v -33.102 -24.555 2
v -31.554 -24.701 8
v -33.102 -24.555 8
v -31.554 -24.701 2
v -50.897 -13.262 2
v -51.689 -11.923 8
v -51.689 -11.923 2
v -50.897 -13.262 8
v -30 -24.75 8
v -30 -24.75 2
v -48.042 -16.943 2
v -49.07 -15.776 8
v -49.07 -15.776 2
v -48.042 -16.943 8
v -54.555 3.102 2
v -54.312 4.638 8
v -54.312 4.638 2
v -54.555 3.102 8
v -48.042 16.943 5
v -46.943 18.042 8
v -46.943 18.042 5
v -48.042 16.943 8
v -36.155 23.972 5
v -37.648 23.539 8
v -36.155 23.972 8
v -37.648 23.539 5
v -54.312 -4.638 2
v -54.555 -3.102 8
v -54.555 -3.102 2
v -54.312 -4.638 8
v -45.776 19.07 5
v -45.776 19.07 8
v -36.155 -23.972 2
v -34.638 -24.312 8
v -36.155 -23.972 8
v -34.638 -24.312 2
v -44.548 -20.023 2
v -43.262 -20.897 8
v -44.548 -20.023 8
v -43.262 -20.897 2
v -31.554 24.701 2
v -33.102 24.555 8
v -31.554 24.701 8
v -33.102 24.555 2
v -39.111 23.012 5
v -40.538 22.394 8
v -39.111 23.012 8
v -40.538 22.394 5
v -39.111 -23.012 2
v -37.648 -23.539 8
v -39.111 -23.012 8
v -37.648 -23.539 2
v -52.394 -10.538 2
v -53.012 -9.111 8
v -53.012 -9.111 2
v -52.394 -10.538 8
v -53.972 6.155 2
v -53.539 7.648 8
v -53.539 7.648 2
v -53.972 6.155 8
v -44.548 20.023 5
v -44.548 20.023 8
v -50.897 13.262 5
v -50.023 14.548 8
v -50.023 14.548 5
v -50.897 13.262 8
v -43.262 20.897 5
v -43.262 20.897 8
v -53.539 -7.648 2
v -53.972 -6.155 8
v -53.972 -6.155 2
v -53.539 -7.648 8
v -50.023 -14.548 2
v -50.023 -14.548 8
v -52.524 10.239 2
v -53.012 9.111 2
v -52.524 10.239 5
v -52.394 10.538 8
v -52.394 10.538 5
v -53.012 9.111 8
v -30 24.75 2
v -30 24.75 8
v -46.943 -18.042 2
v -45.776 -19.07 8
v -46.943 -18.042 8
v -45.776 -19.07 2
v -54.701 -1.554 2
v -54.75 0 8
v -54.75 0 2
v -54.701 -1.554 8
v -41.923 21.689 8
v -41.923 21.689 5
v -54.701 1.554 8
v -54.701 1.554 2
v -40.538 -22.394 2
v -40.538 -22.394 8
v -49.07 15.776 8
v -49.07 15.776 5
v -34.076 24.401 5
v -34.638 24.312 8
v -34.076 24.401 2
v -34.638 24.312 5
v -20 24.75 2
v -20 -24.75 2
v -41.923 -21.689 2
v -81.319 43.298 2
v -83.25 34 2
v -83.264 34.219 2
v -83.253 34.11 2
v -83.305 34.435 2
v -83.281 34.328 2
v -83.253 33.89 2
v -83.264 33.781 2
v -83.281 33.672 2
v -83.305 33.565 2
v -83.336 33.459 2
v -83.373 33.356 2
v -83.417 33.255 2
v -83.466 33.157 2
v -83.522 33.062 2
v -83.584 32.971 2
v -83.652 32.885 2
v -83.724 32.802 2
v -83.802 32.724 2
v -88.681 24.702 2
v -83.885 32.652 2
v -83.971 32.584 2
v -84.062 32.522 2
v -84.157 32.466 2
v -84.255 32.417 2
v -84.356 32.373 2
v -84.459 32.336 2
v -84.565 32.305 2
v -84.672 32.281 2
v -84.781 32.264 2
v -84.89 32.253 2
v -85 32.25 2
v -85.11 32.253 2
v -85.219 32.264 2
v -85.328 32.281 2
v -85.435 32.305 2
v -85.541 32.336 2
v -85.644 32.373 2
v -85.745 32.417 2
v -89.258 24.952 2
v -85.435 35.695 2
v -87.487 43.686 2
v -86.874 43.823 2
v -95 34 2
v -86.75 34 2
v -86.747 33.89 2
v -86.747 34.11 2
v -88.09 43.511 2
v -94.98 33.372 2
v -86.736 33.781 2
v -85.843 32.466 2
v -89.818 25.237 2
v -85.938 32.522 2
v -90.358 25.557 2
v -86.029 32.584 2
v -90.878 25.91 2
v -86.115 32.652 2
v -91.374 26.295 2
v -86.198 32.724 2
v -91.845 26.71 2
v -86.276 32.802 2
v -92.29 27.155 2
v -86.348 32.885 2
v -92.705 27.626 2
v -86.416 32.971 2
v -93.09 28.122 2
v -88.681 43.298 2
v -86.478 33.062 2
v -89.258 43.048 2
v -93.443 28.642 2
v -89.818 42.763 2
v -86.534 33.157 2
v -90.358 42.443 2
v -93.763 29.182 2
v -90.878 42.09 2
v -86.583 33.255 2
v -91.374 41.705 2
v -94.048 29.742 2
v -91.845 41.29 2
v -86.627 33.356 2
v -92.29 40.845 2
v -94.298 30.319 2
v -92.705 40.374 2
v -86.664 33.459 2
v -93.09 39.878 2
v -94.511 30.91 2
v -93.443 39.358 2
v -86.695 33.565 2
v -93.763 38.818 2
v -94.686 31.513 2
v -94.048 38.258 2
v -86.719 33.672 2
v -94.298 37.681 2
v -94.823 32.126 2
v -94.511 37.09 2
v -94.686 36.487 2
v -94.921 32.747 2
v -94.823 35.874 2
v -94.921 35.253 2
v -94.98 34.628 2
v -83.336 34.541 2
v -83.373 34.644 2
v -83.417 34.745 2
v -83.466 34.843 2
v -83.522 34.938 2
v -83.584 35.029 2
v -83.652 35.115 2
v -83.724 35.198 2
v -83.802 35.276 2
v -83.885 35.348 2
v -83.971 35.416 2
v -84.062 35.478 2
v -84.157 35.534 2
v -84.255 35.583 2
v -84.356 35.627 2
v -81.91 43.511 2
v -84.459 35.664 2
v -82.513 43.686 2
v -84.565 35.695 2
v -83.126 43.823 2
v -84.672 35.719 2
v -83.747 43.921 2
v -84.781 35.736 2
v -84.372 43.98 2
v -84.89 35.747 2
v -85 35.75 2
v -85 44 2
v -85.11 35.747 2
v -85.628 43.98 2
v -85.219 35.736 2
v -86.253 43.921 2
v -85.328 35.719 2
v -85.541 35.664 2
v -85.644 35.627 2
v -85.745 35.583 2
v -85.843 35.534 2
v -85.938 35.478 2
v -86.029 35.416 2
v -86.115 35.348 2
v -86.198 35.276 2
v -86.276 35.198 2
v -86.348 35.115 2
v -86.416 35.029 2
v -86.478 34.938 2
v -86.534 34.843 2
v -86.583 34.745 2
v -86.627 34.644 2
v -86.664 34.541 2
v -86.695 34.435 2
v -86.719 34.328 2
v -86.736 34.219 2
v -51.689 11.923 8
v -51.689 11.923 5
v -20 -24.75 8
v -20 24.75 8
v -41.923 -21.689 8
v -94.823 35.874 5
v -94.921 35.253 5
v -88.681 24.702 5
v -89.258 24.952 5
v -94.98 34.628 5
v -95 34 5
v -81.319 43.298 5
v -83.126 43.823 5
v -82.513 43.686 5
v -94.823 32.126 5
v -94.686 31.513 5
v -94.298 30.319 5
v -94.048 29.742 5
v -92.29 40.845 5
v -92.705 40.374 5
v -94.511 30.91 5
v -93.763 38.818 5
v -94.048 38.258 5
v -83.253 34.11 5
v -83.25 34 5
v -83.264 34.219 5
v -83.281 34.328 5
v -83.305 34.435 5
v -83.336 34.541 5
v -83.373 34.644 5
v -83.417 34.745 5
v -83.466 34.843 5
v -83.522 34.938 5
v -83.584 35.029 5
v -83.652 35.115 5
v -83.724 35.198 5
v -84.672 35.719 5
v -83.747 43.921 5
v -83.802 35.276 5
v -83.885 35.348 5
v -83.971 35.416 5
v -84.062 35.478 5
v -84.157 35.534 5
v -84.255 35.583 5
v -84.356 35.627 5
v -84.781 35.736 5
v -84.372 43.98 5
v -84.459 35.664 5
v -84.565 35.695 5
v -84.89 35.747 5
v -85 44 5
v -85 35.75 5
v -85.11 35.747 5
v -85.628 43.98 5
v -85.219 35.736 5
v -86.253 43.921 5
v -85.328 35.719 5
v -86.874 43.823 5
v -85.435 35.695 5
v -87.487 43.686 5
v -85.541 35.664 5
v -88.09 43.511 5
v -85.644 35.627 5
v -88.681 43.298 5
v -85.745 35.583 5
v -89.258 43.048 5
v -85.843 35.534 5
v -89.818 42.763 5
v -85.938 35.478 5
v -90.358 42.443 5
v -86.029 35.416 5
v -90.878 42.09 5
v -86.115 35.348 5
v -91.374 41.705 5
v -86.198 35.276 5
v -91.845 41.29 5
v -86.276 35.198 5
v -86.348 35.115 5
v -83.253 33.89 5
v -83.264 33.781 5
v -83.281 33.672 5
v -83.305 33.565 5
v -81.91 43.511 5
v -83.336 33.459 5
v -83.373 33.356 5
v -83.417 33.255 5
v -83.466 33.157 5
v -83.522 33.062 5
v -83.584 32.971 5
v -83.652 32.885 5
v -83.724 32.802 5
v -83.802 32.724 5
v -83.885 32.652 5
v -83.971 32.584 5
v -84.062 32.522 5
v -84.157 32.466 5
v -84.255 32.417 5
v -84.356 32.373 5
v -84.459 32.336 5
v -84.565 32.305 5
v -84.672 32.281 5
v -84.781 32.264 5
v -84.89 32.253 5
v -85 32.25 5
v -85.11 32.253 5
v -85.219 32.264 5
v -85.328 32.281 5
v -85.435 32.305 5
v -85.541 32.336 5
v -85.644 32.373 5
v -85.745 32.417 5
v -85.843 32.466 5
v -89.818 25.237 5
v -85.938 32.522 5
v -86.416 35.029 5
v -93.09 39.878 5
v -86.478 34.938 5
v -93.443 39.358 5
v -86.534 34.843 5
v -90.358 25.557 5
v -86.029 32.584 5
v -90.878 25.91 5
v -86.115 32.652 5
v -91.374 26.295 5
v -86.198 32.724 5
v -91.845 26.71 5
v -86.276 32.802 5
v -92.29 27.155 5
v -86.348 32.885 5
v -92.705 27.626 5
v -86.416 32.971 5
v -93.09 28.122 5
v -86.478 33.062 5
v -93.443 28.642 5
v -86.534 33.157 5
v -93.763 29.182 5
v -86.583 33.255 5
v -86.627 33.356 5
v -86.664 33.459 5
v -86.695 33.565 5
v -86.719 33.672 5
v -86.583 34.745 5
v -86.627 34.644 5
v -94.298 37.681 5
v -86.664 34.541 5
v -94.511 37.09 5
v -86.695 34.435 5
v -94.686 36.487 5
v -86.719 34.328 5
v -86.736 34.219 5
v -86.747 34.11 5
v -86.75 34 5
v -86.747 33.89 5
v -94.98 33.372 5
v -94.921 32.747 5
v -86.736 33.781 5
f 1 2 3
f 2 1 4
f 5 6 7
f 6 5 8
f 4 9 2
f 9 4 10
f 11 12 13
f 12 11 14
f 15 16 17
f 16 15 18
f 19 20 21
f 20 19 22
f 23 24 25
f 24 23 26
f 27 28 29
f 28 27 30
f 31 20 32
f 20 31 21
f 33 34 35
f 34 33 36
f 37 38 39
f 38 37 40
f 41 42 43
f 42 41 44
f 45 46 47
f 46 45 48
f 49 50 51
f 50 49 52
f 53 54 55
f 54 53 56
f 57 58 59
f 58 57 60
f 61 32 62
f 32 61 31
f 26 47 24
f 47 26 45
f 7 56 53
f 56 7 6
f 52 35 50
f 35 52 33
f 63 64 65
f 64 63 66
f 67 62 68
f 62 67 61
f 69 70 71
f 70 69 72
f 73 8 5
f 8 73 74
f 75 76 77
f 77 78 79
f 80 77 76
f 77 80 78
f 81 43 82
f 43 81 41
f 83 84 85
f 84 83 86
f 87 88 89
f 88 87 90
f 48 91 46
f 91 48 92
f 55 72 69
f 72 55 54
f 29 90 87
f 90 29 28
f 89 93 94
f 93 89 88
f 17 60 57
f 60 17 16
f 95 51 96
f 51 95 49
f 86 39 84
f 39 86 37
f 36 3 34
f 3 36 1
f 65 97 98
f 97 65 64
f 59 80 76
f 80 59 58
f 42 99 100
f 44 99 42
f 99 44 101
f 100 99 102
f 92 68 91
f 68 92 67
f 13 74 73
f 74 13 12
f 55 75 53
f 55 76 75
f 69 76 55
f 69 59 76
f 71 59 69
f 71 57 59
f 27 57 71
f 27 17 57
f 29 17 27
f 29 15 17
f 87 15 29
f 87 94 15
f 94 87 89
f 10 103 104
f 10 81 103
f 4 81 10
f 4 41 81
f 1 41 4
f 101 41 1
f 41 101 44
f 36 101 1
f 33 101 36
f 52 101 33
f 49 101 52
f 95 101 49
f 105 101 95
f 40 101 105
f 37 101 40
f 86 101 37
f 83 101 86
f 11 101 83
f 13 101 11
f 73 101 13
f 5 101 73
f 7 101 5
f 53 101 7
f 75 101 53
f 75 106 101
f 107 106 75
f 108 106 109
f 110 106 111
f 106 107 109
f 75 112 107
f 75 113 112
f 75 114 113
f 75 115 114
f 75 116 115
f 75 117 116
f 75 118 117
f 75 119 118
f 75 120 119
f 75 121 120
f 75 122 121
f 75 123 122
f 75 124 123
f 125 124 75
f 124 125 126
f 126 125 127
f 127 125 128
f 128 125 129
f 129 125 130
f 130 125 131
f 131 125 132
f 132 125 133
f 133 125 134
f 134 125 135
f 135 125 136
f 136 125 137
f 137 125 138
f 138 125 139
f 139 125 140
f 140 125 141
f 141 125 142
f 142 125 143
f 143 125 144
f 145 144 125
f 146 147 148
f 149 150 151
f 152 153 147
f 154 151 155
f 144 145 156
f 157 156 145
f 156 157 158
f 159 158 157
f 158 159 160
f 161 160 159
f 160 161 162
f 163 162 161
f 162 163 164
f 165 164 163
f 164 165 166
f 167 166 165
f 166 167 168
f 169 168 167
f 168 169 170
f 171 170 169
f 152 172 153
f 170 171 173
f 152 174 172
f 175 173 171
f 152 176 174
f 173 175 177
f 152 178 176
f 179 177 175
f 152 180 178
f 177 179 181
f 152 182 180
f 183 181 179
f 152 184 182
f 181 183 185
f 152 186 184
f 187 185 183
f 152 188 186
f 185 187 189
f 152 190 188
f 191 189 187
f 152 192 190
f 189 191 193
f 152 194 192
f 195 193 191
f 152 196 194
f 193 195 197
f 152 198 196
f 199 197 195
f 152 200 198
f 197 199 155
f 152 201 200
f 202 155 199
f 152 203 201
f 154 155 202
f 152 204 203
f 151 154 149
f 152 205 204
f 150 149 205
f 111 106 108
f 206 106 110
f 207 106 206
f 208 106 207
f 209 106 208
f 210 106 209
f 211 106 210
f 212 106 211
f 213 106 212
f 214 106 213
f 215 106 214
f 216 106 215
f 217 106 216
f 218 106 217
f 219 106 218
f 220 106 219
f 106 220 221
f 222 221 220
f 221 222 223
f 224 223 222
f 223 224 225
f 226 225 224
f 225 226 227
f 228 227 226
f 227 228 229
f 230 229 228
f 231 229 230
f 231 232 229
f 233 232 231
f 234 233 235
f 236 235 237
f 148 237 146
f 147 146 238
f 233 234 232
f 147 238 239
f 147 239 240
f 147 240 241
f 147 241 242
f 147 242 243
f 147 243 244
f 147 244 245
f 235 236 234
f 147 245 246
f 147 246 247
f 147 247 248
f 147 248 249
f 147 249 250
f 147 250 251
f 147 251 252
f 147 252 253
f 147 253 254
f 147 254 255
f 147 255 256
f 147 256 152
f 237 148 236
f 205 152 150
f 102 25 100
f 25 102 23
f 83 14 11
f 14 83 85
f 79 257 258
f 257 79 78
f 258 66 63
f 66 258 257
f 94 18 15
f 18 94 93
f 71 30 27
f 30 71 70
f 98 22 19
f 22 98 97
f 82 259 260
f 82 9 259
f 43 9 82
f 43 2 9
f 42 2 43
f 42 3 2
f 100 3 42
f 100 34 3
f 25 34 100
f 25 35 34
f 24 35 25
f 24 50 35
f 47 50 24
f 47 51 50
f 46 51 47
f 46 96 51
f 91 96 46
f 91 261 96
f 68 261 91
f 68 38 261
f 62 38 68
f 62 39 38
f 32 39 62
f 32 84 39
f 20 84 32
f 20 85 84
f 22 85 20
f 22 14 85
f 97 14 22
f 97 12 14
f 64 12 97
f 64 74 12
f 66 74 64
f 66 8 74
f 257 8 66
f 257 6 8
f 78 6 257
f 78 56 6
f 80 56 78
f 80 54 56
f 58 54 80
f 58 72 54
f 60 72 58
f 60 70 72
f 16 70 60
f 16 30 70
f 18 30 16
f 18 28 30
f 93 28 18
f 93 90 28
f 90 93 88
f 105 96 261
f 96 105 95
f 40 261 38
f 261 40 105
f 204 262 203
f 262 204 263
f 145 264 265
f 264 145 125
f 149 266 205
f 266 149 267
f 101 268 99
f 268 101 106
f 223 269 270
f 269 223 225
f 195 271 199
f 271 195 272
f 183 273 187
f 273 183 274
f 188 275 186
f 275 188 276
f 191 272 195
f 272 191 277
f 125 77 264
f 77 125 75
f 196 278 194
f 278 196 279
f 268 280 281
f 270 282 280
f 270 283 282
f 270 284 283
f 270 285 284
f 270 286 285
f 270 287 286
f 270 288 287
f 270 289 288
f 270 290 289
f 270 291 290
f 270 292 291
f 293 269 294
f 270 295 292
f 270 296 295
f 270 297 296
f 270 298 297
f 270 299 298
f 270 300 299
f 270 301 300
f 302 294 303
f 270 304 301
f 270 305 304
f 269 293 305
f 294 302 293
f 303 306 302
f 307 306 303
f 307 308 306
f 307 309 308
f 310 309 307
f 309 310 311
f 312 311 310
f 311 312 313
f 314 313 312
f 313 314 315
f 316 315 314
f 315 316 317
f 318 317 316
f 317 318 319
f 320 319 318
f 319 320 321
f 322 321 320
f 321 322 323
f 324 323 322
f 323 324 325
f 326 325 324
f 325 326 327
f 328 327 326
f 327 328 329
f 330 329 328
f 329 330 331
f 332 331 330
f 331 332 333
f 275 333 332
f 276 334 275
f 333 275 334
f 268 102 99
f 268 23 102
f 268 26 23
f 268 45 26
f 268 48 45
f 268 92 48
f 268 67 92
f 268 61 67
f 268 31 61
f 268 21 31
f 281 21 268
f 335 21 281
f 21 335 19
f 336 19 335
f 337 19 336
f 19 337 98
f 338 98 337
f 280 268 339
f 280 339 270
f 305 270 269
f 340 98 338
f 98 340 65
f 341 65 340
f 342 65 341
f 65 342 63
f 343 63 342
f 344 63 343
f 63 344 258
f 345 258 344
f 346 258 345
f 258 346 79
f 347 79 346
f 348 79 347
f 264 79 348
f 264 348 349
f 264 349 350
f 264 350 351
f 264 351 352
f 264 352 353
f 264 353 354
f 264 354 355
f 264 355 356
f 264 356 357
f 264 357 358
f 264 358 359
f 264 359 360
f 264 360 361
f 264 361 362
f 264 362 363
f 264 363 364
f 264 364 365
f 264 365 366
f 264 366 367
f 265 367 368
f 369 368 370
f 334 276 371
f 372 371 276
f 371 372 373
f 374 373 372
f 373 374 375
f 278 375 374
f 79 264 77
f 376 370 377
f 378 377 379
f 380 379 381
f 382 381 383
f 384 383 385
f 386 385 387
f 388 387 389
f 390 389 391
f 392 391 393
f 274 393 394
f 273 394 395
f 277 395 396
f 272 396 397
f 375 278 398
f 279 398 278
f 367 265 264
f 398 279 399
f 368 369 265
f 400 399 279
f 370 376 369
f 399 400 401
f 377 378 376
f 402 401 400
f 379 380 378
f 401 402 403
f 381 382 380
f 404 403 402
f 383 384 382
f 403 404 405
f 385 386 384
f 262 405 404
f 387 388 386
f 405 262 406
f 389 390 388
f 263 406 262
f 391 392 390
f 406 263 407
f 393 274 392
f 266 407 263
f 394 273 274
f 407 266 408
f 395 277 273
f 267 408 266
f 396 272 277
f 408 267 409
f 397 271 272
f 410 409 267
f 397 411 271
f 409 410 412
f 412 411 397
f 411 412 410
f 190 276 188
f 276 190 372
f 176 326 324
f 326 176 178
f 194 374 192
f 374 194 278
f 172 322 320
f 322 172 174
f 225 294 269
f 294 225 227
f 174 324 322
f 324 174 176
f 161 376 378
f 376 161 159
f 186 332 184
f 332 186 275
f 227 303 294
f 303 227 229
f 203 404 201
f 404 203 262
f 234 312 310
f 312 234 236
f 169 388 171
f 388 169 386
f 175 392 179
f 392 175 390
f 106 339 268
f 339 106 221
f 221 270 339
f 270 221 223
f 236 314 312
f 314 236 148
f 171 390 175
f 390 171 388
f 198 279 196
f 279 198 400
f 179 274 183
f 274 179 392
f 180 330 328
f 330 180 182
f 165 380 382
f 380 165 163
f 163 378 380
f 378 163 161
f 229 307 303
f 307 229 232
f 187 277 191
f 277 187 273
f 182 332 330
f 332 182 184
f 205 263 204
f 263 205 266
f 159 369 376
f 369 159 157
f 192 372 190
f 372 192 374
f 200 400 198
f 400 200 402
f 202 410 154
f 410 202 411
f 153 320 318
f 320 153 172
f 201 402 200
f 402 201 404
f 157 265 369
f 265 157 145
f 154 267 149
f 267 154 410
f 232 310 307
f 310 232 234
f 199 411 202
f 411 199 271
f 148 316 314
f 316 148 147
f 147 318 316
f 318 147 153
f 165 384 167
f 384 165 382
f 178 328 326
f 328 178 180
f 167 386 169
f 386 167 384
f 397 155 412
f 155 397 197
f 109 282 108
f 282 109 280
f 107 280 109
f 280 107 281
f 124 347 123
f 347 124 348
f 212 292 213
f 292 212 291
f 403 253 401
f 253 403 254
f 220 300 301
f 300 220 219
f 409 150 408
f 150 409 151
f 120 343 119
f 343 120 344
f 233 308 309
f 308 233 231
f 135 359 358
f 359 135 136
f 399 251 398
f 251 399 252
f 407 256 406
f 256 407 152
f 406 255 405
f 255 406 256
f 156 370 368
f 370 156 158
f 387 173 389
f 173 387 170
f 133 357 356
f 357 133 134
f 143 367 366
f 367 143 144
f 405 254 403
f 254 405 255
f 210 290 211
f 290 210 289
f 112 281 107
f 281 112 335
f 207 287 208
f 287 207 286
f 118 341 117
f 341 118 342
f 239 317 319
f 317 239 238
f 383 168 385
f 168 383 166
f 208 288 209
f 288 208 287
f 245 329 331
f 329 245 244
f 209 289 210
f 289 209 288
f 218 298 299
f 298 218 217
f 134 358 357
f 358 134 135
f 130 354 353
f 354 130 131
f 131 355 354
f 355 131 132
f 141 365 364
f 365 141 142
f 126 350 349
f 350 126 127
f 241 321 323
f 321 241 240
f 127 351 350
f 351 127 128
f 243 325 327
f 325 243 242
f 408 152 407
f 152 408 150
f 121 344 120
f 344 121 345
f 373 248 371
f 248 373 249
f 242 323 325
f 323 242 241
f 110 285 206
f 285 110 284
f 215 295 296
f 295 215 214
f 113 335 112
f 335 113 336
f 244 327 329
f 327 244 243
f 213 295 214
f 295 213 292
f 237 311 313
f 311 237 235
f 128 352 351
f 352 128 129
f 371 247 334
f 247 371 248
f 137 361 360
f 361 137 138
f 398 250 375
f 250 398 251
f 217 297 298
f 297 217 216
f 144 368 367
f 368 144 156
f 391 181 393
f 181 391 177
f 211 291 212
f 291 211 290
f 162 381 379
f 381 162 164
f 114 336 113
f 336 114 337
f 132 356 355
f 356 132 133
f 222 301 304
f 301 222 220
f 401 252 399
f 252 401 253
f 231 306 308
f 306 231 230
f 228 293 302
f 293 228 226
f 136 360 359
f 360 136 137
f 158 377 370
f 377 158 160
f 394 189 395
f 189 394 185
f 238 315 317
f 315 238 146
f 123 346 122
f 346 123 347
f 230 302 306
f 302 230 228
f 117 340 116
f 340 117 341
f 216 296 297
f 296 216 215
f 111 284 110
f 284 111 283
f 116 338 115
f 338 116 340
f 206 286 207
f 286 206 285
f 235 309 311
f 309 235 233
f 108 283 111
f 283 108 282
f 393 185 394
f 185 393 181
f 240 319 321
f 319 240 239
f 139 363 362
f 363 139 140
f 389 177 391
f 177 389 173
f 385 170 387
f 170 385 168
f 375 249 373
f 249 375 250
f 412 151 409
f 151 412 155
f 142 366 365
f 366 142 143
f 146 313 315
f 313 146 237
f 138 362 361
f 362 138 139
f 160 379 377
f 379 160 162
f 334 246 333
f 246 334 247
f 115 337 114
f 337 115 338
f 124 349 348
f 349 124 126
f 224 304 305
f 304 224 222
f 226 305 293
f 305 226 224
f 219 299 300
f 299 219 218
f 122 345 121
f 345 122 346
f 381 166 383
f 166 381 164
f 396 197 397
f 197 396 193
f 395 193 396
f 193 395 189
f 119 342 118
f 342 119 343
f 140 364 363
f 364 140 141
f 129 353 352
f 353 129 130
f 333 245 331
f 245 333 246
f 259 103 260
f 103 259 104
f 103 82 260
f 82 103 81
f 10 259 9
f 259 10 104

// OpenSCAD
// file: car_v10_lib.scad
module _guanDao(){
    
    circle(0.6); 
    translate([0,-0.5]) square([1.2,1],center=true);
    translate([0,-1]) circle(0.6); 
    
}
 
module cyInterfaceBig(t_d=4.8,fk=1.1,_h = 36){
    __h = _h/2-2;
    difference(){ 
        union(){
            cylinder(d=t_d,h=_h,center=true);
            translate([0,0,__h]) {
                cylinder(d1=t_d*fk,d2 = t_d,h=3,center=false);
                translate([0,0,-2]) cylinder(d=t_d*fk,h=2,center=false);
                translate([0,0,-5]) cylinder(d2=t_d*fk,d1 = t_d,h=3,center=false);
            }
        }
        translate([0,0,__h]) cube([t_d+2,t_d/5,t_d+10],center=true);
    }    
}
module cyInterface(t_d=4.8,fk=0.8,_h = 36){
    __h = _h/2-1;
    difference(){ 
        union(){
            cylinder(d=t_d,h=_h,center=true);
            translate([0,0,__h]) {
                cylinder(d1=t_d+fk,d2 = t_d,h=2,center=false);
                translate([0,0,-1]) cylinder(d=t_d+fk,h=1,center=false);
                translate([0,0,-3]) cylinder(d2=t_d+fk,d1 = t_d,h=2,center=false);
            }
        }
        translate([0,0,__h]) cube([t_d+2,1,10],center=true);
    }    
}



module _links( dx = 14){
    out_d = 9.5;
    //l_h = 3.4;
    t_d = 4.8;    
    t_h_ = 26;
    //t_y_ = 12.3;
    
    translate([-8,0,1.5]) rotate([0,-90,0]) difference(){
        cyInterface(t_d = t_d,_h = t_h_);
        translate([-2.5,0,0]) cube([2,6,t_h_*2],center=true);
    }
    /*
    difference(){
        //hull(){
        translate([dx,0,0]) union(){
            cylinder(d=out_d,h=2,center=false);
            translate([-out_d/2,0,1]) cube([out_d,out_d,2],center=true);
        }
          //  translate([-dx,0,0]) cylinder(d=out_d,h=2,center=false);
        //}
        translate([dx,0,0]) cylinder(d=5.5,h=5,center=true);
        //translate([-dx,0,0]) cylinder(d=5.5,h=5,center=true);
    }
    */
}
function kugel_zu_kart(vect) = [
	vect[0]*sin(vect[1])*cos(vect[2]),  
	vect[0]*sin(vect[1])*sin(vect[2]),
	vect[0]*cos(vect[1])
];
// file: car_v10_motor_room.scad
use <car_v10_lib.scad>
$fn=80;
motorRoom();
module motorRoom(_h=18,_d=25){
    ___h = _h+1.6;
    
    _gh = 7;
    
   // rotate([0,90,0])  
    
      
    difference(){
        union(){
            rotate([0,90,0]) union(){
                intersection(){
                    cylinder(d=_d,h=_h);
                    translate([0,0,_h/2]) cube([19.5,_d,_h],center=true);
                    
                }
                translate([0,0,-2.6])  _ring_lib();
                // translate([0,0,_h-_gh]) cylinder(d1 = _d,d2=_d+2,h=_gh);
               
            } 
        }
        translate([15.3,0,0])  cylinder(d=3.5,h=40,center=true);
        
        translate([15.8,0,0])   rotate([0,90,0]) rotate_extrude(angle=360) translate([12.5,0]) _guanDao();        
        translate([15.8,0,9.8])  rotate([0,90,0]) rotate([90,0,0])   linear_extrude(height=30,center=true) _guanDao();
        translate([15.8,0,-9.8])  rotate([0,90,0]) rotate([90,0,0])   linear_extrude(height=30,center=true) _guanDao();
        
        translate([_h/2,0,0]) union(){
            intersection(){
                rotate([0,90,0]) cylinder(d=21.5,h=___h,center=true);
                cube([___h,25,16],center=true);
            }
          //  cube([___h,6,20],center=true);
        } 
       
     // translate([_h-_gh/2,0,0]) # cube([_gh,16,28],center=true); 
    }
}


module _ring_lib(){ 
    union(){
        //#motor();
        difference(){
            intersection(){
                cylinder(r2=16.5,r1=15.5 ,h=2.6);
                cylinder(r=16.2,h=2.6);
            }
            translate([0,0,-4])cylinder(h=27,d=9.5);
        }

        intersection(){
            translate([0,0,0]) union(){
                cylinder(r1=18,r2=18.4 ,h=2.6);
                //translate([0,0,-0.5]) cylinder(r=16,h=5);
            } 
            _ring_Ka(r=17,x=5,y=5.3,m=9,z=2.6); 
        }
        
        intersection(){
            translate([0,0,1.8]) union(){
                cylinder(r=18.5 ,h=2.6);
                //translate([0,0,-0.5]) cylinder(r=16,h=5);
            } 
            _ring_Ka(r=17,x=5,y=5.3,m=9,z=2.6); 
        }
    }   
    
    
    module _ring_Ka(x=5,y=1.8,z=4,r=19,m=6){    
    tou = 360/m;             
    for(n=[0:1:m-1]){
        translate(kugel_zu_kart([r,90,360/m*n]))  translate([0,0,0])  rotate([0,0,tou*n])       translate([0,0,z/2]) cube([x,y,z],center=true);
    }
    
}
 
}
// main file
use <car_v10_battery.scad>
use <car_v10_motor_room.scad>

$fn=100;
_r = 65;
_h=30;
my=30;

translate([0,-12,-26.6])  batteryBody();
finderFixDown();
mirror([0,1,0]) finderFixDown();
!finderFix();
 
module finderFix(){
    outx = -50;
    outy = 20;
    translate([-30,0,5]){
        translate([5,0,0]) cube([10,49.5,6],center=true);
        difference(){        
            cylinder(d=49.5,h=6,center=true);
            translate([20,0,0]) cube([40,49.5,7],center=true);
        }
        translate([-5,14,-1.5]) difference(){
            hull(){        
                cylinder(d=20,h=3,center=true);
                translate([outx,outy,0]) cylinder(d=20,h=3,center=true);
            }
            translate([outx,outy,0]) cylinder(d=3.5,h=10,center=true);
            //translate([-30,0,0]) cylinder(d=3.5,h=10,center=true);
        }
    }
    /*
    #union(){
        translate([0,0,0]) cube([8,13,22],center=true);
        translate([-15,0,0])  rotate([0,0,0]) {
            translate([0,3.5,0])   cylinder(d=5.5,h=20,center=true);
            translate([0,-3.5,0])  cylinder(d=5.5,h=20,center=true);
        }
    }
    */
    
}
module finderFixDown(){
    
    difference(){
        translate([0,30,5])  difference(){
            translate([0,-10,0]) cube([60,30,15],center=true);
            translate([0,-20,2])  cube([32,20,14],center=true);
            translate([0,15,5])  cube([32,70,10],center=true);            
        }
        //#fire();        
        
        difference(){
            translate([0,10,5])  cube([80,30,6.4],center=true);    
            //translate([0,my+160,32]) cylinder(d=_r*4-1,h=70,center=true);
            cube([39.6,200,40],center=true);
            
            translate([0,0,32]) union(){                
                translate([-24,0,-30])  cube([1.8,300,1.6],center=true);
                translate([-27,0,-24])  cube([1.8,300,1.6],center=true);
                
                translate([24,0,-30])  cube([1.8,300,1.6],center=true);
                translate([27,0,-24])  cube([1.8,300,1.6],center=true);
            }
        }
        
        translate([12,12,0]) cylinder(d=5.4,h=20,center=true);
        translate([-12,12,0]) cylinder(d=5.4,h=20,center=true);
    }
    
}
 
